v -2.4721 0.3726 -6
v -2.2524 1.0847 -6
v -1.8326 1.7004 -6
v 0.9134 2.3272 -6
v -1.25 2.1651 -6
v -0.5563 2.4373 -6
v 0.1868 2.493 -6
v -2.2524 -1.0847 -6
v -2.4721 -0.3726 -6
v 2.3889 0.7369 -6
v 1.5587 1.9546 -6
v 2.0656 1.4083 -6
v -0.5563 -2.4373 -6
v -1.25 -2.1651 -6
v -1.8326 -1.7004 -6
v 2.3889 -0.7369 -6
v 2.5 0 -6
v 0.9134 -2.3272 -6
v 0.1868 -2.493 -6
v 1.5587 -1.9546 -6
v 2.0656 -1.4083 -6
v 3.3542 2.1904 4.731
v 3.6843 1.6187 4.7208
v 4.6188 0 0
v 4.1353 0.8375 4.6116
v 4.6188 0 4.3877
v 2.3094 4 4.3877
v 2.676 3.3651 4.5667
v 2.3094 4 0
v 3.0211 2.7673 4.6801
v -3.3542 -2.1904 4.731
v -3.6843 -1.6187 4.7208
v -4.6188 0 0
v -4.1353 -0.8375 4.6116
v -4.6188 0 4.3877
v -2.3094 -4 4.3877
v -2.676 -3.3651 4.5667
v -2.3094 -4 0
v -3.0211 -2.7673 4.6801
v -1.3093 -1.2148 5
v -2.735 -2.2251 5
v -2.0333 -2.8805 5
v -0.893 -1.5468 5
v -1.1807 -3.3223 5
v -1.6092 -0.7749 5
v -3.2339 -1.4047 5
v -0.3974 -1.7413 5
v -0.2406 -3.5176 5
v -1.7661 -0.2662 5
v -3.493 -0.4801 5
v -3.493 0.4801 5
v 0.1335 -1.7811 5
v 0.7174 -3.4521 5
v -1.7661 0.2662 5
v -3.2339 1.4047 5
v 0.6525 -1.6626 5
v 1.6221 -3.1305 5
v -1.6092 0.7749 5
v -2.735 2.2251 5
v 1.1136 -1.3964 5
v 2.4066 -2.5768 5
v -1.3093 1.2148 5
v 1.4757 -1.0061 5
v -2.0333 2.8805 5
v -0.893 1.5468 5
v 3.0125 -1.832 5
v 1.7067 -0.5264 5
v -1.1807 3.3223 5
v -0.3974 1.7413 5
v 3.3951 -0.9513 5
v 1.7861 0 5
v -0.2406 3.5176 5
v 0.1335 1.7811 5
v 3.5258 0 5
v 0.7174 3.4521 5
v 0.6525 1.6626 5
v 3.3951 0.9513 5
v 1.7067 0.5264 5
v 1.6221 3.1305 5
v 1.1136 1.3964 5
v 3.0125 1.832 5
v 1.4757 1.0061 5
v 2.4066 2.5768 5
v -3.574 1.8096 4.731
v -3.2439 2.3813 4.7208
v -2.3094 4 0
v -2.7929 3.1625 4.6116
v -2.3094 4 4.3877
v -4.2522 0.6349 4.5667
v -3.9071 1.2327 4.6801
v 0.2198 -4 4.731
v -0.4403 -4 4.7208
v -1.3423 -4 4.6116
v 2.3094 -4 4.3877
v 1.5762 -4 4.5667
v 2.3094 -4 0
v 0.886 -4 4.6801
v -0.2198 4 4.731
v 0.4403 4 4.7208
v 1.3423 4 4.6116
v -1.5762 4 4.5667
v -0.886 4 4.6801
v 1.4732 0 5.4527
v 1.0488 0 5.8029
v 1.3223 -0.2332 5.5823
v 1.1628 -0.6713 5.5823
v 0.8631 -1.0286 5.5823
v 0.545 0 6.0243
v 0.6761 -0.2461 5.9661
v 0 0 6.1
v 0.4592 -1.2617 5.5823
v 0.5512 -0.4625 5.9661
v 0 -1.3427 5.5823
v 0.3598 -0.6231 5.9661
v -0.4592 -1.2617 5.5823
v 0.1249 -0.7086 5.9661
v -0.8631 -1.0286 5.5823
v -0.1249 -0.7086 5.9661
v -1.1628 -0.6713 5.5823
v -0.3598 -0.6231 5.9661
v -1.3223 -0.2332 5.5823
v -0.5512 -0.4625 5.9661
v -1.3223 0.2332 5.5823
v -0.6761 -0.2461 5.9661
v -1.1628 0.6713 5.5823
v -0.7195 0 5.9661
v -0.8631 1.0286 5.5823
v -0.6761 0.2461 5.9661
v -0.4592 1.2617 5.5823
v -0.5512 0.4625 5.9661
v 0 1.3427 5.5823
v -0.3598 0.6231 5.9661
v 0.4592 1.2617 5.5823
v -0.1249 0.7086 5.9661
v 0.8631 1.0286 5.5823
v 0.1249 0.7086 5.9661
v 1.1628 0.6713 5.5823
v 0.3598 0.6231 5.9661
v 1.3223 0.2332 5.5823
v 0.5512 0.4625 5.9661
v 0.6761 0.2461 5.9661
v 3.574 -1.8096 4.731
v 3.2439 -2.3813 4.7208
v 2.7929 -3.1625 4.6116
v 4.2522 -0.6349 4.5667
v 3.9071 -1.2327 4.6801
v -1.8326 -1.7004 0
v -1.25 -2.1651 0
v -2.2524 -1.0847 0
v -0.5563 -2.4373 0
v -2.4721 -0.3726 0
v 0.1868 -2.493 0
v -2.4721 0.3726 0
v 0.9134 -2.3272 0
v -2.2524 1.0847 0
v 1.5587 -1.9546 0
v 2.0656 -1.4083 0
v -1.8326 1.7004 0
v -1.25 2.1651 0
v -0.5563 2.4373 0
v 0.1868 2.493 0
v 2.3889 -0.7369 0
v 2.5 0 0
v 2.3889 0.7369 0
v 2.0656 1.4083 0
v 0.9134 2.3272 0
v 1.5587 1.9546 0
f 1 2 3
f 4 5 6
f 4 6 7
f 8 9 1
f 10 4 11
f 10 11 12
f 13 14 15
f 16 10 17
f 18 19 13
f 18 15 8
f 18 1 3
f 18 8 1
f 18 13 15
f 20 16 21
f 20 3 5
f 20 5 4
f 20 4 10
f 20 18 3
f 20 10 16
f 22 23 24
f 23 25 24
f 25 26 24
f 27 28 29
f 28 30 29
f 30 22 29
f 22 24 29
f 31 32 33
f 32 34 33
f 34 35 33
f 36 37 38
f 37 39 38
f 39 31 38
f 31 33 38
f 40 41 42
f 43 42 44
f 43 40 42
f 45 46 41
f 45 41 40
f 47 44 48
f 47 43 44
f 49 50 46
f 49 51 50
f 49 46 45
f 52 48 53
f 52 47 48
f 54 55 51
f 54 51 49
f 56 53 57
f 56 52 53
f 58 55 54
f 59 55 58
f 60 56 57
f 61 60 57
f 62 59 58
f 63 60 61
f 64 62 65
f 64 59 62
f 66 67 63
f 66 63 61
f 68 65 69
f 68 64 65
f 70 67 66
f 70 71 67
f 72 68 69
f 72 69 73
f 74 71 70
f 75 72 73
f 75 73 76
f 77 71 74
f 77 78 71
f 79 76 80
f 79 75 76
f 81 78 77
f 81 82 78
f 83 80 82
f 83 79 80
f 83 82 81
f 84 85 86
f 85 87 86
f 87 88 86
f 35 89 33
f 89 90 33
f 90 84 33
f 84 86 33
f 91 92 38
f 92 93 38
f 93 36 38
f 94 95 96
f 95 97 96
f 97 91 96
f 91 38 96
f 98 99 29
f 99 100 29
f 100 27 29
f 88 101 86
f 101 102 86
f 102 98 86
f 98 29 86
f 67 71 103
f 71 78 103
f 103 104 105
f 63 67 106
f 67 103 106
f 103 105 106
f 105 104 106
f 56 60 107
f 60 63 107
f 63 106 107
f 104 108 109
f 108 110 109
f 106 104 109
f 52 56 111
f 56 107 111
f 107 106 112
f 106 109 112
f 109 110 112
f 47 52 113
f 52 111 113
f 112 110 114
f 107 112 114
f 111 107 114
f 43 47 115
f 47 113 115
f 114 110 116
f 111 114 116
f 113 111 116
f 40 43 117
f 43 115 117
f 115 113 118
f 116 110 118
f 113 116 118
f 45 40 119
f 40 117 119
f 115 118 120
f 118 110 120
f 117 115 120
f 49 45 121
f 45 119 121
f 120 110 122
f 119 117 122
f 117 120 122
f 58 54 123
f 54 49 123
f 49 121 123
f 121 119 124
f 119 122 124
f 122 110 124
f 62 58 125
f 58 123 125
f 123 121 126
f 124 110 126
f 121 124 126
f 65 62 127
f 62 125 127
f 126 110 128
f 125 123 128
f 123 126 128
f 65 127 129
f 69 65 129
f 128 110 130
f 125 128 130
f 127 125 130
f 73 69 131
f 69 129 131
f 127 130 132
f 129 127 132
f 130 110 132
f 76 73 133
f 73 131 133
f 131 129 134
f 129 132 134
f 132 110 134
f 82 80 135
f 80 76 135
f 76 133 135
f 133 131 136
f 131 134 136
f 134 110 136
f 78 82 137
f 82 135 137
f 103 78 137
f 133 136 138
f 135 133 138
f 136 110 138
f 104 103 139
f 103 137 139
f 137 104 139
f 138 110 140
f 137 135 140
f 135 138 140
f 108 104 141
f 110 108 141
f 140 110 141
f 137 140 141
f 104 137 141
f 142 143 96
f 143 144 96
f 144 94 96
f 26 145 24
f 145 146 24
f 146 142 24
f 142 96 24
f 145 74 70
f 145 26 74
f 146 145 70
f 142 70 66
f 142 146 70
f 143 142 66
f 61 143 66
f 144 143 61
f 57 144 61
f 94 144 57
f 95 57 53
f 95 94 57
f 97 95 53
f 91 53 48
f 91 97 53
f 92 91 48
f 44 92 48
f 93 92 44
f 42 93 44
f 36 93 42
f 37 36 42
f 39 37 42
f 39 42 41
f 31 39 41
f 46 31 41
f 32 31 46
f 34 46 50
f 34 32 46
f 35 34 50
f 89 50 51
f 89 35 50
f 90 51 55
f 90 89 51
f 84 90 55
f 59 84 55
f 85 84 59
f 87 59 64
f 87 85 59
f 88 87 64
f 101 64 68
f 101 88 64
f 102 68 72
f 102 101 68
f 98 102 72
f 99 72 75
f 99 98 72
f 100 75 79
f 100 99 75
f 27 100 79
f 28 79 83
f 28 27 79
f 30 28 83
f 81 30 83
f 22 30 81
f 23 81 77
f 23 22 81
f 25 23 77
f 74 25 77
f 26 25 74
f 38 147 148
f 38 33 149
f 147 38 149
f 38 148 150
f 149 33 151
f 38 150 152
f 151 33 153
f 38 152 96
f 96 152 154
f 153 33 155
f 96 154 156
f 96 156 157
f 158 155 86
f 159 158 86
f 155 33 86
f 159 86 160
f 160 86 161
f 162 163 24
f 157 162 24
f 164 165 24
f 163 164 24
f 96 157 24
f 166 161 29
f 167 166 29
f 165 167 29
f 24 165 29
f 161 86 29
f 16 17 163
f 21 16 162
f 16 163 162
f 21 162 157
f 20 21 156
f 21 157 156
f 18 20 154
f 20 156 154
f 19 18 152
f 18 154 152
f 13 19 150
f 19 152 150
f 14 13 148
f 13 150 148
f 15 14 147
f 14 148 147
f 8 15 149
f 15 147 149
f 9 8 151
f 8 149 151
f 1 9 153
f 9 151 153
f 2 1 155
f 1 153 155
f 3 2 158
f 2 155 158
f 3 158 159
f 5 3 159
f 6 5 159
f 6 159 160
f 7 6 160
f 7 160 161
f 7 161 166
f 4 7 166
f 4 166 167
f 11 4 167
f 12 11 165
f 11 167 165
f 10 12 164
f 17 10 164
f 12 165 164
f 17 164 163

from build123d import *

# Parameters (mm, degrees)
F1_DEPTH = 5
F2_R     = 2.5
F3_DEPTH = 6


with BuildPart() as f1:
    # F0 (on Top) → F1 (new body)
    with BuildSketch(Plane.XY):
        Polygon((2.309401, 4), (-2.309401, 4), (-4.618802, 0), (-2.309401, -4), (2.309401, -4), (4.618802, 0), align=None)
    extrude(amount=F1_DEPTH)

    # F2 (on face) → F3 (join)
    with BuildSketch(Plane(origin=(0, 0, 0), x_dir=(1, 0, 0), z_dir=(0, 0, -1))):
        Circle(F2_R)
    extrude(amount=F3_DEPTH)

    # F4 (on Front) → F5 (revolve, cut)
    with BuildSketch(Plane.XZ):
        Polygon((1.241204, 6.975186), (1.241204, 6.27986), (5.267579, 4.024274), (5.267579, 6.975186), align=None)
    revolve(axis=Axis((0, 0, 6.94047), (0, 0, -1)), mode=Mode.SUBTRACT)

    # F6 (on Front) → F7 (revolve)
    with BuildSketch(Plane.XZ):
        with BuildLine():
            Line((0, 6.1), (0, 2.1))
            ThreePointArc((0, 2.1), (2, 4.1), (0, 6.1))
        make_face()
    revolve(axis=Axis((0, 0, 4.1), (0, 0, -1)))


solid = f1.part
